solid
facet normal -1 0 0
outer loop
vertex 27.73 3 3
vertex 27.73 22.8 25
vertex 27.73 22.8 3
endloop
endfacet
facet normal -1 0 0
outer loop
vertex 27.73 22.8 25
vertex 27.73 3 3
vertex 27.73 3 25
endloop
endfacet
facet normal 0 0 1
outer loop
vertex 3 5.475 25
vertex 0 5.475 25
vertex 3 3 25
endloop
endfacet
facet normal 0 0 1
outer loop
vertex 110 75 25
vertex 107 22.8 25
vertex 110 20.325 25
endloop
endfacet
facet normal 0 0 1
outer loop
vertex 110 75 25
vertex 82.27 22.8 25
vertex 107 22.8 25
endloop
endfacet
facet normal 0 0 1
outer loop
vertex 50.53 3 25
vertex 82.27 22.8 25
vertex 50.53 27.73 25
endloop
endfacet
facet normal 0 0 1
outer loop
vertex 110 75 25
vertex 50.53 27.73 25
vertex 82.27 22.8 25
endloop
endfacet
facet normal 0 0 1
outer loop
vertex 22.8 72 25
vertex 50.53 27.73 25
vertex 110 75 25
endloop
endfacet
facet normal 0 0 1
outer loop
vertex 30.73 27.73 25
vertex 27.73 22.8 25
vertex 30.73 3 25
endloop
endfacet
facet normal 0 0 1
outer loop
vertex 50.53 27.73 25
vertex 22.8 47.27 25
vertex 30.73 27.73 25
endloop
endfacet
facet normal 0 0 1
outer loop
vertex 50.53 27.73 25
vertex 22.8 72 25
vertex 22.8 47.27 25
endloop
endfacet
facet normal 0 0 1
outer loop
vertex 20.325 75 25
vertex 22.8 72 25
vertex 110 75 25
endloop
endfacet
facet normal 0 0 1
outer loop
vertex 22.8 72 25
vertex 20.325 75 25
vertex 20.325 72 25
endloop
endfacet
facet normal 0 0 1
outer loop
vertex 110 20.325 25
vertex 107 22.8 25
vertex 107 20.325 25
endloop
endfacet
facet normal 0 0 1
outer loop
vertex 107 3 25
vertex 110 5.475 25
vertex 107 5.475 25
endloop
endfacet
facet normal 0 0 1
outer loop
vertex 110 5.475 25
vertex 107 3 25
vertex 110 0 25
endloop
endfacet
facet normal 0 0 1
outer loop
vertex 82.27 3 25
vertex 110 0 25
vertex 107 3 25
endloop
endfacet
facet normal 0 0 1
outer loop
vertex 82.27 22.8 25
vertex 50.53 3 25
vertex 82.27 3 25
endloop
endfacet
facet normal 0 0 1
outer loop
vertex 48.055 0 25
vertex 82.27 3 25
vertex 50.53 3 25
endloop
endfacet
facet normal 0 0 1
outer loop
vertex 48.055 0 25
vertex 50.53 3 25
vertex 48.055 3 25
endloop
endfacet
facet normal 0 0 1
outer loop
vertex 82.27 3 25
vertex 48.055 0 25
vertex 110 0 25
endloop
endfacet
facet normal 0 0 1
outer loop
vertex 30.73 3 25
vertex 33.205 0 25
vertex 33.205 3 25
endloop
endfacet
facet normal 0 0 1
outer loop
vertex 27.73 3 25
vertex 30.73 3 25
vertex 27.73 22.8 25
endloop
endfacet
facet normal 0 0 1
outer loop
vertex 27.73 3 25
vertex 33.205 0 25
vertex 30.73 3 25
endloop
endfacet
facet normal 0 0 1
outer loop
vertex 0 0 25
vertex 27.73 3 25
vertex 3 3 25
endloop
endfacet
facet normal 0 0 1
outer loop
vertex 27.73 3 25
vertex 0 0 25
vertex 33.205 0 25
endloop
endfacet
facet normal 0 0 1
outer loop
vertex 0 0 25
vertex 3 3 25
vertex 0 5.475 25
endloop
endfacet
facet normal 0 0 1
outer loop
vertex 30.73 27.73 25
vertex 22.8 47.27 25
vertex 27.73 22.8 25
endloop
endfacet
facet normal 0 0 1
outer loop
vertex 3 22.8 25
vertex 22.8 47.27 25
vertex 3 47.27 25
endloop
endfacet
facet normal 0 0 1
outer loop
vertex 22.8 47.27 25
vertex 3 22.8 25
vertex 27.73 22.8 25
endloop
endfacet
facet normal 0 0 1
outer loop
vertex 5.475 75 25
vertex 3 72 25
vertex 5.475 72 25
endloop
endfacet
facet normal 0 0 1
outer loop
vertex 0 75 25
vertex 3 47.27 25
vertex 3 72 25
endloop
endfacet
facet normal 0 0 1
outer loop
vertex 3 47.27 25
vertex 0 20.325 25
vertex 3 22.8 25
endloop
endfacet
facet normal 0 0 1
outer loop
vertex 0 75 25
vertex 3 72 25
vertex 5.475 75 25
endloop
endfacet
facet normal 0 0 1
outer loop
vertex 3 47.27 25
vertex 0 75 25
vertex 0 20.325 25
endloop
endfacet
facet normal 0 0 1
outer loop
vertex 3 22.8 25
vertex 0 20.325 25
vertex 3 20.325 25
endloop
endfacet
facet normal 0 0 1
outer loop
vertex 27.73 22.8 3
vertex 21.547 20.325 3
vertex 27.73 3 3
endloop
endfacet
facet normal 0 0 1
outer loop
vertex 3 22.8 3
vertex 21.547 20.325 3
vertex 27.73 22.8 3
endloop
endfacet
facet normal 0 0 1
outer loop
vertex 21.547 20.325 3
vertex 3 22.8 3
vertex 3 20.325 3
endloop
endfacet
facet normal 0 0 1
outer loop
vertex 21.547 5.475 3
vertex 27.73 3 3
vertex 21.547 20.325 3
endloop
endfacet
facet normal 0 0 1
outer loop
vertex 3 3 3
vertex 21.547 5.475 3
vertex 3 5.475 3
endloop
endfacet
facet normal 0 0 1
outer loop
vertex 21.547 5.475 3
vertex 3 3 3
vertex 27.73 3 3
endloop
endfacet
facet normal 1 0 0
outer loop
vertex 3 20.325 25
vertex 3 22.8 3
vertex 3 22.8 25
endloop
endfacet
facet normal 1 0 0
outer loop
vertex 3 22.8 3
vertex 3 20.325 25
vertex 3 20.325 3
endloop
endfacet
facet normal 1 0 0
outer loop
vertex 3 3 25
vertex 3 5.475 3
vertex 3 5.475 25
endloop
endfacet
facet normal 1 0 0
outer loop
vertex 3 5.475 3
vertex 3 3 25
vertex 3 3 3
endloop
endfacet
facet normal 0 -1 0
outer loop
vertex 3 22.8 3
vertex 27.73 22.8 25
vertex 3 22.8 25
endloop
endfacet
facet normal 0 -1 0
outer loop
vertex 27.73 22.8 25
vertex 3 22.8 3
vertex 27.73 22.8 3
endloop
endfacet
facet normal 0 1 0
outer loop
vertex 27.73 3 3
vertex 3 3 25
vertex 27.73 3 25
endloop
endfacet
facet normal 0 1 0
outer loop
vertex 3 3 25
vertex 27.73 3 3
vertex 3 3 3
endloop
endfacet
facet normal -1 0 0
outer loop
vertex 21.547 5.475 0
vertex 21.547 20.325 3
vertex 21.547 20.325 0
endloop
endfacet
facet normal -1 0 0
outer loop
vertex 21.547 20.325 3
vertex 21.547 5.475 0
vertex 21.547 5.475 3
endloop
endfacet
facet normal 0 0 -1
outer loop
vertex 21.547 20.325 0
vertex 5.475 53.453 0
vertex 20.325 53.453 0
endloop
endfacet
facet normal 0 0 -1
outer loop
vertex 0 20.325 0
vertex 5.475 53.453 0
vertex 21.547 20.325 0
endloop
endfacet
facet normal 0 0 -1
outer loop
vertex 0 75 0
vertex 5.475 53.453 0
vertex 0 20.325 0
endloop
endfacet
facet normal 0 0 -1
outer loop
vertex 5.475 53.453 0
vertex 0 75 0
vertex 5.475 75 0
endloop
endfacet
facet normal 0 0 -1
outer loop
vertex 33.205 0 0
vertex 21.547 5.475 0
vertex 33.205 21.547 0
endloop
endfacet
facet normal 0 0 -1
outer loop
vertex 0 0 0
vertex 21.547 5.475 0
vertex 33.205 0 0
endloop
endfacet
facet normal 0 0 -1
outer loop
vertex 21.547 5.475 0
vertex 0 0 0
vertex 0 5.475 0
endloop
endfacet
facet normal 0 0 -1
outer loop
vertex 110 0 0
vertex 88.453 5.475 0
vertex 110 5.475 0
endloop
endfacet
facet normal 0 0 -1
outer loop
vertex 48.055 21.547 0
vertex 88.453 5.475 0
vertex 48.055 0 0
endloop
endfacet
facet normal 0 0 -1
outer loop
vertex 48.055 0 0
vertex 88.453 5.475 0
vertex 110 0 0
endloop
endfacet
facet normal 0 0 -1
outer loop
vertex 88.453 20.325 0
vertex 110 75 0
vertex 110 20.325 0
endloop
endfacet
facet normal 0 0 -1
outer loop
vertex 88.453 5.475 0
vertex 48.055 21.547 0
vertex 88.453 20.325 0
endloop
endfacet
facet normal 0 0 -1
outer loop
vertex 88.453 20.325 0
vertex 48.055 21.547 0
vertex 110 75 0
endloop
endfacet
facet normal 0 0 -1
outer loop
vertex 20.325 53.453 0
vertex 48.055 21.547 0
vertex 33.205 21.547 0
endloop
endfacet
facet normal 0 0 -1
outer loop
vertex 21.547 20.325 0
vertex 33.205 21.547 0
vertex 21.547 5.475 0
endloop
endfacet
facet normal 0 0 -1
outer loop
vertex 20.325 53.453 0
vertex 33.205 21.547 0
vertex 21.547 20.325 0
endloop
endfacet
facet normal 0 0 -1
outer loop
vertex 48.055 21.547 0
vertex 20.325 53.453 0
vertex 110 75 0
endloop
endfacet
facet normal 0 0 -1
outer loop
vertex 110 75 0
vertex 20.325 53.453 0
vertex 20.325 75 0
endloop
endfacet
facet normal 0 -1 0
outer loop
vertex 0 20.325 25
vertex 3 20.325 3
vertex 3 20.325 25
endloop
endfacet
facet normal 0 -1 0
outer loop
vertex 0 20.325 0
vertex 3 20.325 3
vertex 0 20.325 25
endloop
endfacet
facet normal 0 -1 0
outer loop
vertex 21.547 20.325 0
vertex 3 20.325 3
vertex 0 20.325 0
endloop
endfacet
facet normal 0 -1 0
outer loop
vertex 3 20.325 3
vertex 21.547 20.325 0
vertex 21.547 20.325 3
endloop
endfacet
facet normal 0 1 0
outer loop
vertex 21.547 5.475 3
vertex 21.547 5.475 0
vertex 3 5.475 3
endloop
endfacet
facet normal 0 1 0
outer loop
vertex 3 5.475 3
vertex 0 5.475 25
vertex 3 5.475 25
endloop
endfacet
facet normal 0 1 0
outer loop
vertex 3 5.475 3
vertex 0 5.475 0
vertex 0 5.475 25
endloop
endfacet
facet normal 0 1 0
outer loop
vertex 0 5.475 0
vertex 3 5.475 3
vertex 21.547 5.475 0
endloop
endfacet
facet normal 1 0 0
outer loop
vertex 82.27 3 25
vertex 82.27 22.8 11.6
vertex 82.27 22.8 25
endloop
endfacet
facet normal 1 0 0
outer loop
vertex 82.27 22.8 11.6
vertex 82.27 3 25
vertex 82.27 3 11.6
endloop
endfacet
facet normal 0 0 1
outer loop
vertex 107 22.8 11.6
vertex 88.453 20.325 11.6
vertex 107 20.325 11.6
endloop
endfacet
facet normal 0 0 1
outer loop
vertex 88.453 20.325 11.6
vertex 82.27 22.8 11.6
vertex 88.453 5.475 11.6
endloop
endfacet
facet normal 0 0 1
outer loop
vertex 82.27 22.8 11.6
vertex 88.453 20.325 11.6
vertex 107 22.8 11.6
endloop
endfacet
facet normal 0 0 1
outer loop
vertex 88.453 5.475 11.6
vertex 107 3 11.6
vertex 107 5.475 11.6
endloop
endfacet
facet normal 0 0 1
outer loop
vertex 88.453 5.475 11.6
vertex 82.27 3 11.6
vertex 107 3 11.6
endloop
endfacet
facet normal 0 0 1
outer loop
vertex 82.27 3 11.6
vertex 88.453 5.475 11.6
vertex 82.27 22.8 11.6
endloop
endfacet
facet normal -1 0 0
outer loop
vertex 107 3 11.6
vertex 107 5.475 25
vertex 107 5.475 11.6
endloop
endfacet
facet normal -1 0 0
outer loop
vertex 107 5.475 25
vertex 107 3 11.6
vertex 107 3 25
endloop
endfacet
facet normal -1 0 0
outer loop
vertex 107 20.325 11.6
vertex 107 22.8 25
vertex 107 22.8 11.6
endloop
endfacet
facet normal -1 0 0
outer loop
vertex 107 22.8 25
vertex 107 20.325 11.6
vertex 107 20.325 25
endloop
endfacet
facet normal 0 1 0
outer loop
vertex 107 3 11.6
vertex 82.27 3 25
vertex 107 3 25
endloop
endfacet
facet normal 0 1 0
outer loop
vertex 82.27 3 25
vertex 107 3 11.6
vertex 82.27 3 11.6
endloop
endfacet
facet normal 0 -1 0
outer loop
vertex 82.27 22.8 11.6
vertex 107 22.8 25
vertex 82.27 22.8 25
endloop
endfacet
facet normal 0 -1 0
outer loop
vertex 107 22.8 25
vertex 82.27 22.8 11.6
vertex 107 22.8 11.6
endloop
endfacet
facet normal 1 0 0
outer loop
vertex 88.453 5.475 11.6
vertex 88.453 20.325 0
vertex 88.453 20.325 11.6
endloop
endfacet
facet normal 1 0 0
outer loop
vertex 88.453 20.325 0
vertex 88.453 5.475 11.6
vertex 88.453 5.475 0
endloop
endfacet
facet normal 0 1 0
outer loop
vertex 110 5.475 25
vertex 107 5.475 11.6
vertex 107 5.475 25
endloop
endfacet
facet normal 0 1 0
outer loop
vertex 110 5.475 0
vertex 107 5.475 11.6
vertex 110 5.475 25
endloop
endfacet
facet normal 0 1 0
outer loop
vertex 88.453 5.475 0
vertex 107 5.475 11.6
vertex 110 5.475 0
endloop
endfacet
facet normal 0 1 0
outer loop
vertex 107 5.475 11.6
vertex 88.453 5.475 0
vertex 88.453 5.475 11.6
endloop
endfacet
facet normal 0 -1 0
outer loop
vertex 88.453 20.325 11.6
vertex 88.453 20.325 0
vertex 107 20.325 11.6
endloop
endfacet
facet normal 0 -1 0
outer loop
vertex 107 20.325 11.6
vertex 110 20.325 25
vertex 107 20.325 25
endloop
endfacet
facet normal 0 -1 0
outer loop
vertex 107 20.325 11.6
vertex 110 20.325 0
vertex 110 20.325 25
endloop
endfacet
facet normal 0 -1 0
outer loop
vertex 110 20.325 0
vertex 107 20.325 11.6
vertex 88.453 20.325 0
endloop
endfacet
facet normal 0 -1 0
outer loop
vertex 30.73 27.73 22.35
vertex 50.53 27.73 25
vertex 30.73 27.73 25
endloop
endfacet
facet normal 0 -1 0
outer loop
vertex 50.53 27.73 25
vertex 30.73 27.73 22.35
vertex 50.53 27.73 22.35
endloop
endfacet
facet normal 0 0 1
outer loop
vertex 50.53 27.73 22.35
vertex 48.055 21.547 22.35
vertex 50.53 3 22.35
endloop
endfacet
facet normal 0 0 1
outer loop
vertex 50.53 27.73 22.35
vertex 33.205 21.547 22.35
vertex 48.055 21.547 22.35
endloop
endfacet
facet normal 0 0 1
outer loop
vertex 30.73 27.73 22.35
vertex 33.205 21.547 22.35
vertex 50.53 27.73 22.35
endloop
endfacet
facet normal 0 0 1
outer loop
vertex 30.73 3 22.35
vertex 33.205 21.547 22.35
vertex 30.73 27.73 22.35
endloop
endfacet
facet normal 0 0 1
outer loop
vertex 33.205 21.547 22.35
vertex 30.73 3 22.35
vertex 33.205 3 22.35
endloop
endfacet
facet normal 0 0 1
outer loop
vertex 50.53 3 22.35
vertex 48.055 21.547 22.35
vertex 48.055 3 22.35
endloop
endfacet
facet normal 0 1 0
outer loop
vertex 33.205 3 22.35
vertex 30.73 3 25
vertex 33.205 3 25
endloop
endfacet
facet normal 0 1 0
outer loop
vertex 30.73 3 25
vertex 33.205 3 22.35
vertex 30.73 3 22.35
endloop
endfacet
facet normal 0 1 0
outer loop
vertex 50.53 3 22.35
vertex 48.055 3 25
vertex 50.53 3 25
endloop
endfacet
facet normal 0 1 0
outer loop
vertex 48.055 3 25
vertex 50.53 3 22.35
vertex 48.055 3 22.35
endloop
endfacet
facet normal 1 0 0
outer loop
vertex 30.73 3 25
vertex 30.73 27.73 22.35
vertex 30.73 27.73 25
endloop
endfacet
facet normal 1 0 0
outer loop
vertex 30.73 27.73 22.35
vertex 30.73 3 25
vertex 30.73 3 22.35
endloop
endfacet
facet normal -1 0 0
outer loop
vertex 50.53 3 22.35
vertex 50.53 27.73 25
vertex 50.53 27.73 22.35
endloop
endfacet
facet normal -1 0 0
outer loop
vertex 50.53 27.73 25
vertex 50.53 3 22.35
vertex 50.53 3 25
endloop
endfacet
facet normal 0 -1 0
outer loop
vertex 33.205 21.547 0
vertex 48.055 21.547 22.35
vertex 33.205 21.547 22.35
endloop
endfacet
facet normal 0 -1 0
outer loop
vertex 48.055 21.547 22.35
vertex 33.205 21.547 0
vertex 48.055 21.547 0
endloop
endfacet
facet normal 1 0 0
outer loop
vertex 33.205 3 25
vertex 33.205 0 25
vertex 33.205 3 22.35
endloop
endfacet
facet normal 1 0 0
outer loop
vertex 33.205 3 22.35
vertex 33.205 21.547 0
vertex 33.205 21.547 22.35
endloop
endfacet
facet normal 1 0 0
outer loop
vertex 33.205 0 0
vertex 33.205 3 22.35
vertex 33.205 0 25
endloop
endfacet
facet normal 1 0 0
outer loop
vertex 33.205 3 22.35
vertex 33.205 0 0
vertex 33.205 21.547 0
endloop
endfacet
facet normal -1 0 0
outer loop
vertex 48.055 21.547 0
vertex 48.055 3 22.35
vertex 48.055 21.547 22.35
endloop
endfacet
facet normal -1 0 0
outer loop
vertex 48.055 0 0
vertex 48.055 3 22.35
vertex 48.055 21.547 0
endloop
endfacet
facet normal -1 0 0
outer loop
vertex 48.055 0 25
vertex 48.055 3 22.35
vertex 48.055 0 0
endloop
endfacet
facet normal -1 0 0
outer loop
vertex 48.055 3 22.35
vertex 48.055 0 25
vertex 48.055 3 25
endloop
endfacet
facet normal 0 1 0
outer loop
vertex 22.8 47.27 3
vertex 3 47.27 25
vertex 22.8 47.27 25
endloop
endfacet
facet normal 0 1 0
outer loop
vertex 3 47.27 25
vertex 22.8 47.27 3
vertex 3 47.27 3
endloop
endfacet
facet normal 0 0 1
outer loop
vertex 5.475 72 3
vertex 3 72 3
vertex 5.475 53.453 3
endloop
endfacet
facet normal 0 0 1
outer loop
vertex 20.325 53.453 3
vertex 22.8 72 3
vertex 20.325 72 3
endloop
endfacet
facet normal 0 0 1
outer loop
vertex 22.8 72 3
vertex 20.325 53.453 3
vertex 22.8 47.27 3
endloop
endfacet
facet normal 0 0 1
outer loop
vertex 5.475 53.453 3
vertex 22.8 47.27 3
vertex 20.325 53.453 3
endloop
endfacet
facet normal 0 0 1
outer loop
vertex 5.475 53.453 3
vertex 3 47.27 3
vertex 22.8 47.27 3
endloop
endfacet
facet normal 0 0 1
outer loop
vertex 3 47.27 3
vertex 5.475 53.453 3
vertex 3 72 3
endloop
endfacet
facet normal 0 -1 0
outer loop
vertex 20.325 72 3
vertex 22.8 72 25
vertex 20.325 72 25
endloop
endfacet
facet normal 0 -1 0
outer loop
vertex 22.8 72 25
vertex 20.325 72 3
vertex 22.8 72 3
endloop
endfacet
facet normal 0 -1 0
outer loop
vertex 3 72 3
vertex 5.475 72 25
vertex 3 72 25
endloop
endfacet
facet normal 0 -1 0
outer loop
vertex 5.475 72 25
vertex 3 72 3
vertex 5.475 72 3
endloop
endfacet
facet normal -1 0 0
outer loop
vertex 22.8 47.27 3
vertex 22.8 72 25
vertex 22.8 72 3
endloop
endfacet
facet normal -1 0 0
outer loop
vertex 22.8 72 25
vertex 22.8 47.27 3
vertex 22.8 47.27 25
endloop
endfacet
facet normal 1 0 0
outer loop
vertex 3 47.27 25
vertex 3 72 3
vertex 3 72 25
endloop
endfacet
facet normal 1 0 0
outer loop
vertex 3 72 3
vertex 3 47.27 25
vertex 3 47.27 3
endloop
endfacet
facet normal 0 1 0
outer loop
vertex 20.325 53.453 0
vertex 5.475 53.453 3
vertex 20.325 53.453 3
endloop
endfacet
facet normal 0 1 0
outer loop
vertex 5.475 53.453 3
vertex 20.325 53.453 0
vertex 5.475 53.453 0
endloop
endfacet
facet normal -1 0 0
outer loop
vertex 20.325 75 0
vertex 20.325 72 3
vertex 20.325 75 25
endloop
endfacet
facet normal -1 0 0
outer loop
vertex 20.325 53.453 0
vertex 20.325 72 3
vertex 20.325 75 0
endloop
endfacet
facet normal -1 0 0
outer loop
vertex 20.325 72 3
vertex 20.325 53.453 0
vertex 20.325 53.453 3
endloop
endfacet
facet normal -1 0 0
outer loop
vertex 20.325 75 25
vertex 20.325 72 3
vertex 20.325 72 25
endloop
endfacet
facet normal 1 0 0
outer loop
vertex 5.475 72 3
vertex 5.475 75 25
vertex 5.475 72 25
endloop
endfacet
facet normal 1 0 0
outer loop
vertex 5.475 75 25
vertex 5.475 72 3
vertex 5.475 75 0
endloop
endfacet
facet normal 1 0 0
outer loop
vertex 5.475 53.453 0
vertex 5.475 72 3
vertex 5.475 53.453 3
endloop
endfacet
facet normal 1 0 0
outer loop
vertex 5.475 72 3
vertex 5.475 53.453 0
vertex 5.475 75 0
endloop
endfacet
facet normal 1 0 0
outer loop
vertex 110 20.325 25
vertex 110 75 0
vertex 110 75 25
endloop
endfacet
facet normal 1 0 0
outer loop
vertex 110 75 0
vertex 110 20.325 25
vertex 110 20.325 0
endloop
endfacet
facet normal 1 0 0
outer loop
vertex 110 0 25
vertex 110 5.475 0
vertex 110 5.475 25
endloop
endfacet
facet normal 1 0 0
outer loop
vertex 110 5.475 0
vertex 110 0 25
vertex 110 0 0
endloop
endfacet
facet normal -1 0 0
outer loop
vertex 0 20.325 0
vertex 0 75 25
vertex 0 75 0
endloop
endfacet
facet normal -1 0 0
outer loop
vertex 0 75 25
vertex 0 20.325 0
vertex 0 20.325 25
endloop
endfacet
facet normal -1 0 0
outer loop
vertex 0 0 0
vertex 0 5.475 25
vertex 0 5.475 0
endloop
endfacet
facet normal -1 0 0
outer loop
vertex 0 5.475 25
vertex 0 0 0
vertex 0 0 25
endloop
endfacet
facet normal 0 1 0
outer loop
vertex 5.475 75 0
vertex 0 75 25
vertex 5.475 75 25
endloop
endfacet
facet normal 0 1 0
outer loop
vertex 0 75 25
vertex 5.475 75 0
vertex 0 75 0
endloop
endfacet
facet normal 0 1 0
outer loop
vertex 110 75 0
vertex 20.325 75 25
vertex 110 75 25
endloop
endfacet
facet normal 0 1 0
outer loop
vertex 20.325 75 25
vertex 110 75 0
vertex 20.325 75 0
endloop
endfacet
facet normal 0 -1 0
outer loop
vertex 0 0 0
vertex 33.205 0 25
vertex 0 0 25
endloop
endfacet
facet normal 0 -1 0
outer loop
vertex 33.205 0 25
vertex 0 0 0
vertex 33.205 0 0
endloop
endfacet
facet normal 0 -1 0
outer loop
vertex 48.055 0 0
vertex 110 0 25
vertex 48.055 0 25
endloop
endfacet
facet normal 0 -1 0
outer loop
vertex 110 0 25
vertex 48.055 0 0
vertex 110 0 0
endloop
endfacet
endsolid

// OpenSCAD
// file: SquarePileLib.scad
module LeftPile(wallThickness, totalHeight, singlePileHeight, singlePileWidth, singlePileLength, pileCount, openingSizePercent = .75){
    pileHeight = (pileCount * singlePileHeight) + .5;
    lengthOpeningSize = singlePileLength * openingSizePercent;
    widthOpeningSize = singlePileWidth * openingSizePercent;
    blockerSize = (singlePileWidth - widthOpeningSize) / 2;
    
    translate([wallThickness, wallThickness, totalHeight - pileHeight])
        cube([singlePileLength, singlePileWidth, pileHeight]);
    translate([-.00001, wallThickness + (blockerSize), 0])
        cube([wallThickness + lengthOpeningSize, widthOpeningSize, totalHeight]);
}

module RightPile(wallThickness, totalHeight, singlePileHeight, singlePileWidth, singlePileLength, pileCount, openingSizePercent = .75){
    translate([0, wallThickness + wallThickness + singlePileWidth, 0])
        rotate([0, 0, 180])
            LeftPile(wallThickness, totalHeight, singlePileHeight, singlePileWidth, singlePileLength, pileCount);
}

module BottomPile(wallThickness, totalHeight, singlePileHeight, singlePileWidth, singlePileLength, pileCount, openingSizePercent = .75){
    translate([wallThickness + wallThickness + singlePileWidth, 0, 0])
        rotate([0, 0, 90])
            LeftPile(wallThickness, totalHeight, singlePileHeight, singlePileWidth, singlePileLength, pileCount);
}

module TopPile(wallThickness, totalHeight, singlePileHeight, singlePileWidth, singlePileLength, pileCount, openingSizePercent = .75){
        rotate([0, 0, 270])
            LeftPile(wallThickness, totalHeight, singlePileHeight, singlePileWidth, singlePileLength, pileCount);
}
// file: ColonistsTool3xLib.scad
include<SquarePileLib.scad>
//25.82 by 32.82 by 2.15
singleTool3xPileHeight = 2.15;
singleTool3xPileWidth = 19.30 + .5;
singleTool3xPileLength = 24.23 + .5;

module LeftTool3xPile(wallThickness, totalHeight, tool3xPileCount){
    LeftPile(
        wallThickness,
        totalHeight,
        singleTool3xPileHeight,
        singleTool3xPileWidth,
        singleTool3xPileLength,
        tool3xPileCount);
}

module RightTool3xPile(wallThickness, totalHeight, tool3xPileCount){
    RightPile(
        wallThickness,
        totalHeight,
        singleTool3xPileHeight,
        singleTool3xPileWidth,
        singleTool3xPileLength,
        tool3xPileCount);
}

module BottomTool3xPile(wallThickness, totalHeight, tool3xPileCount){
    BottomPile(
        wallThickness,
        totalHeight,
        singleTool3xPileHeight,
        singleTool3xPileWidth,
        singleTool3xPileLength,
        tool3xPileCount);
}

module TopTool3xPile(wallThickness, totalHeight, tool3xPileCount){
    TopPile(
        wallThickness,
        totalHeight,
        singleTool3xPileHeight,
        singleTool3xPileWidth,
        singleTool3xPileLength,
        tool3xPileCount);
}

function tool3xPileHeight(tool3xPileCount) =
    (tool3xPileCount * singleTool3xPileHeight) + .5;
// main file
include<ColonistsTool3xLib.scad>
difference() {
    testBoxHeight = tool3xPileHeight(10) + 3;
    testBoxLength = 110;
    testBoxWidth = 75;
    wallThickness = 3;
    
    cube([testBoxLength, testBoxWidth, testBoxHeight]);
    LeftTool3xPile(wallThickness, testBoxHeight, 10);
//    translate([100 - (15.05 + .8), 0, 0])
    translate([testBoxLength, 0, 0])
        RightTool3xPile(wallThickness, testBoxHeight, 6);
    translate([singleTool3xPileLength + wallThickness, 0, 0])
        BottomTool3xPile(wallThickness, testBoxHeight, 1);
    translate([0, testBoxWidth, 0])
        TopTool3xPile(wallThickness, testBoxHeight, 10);
}
